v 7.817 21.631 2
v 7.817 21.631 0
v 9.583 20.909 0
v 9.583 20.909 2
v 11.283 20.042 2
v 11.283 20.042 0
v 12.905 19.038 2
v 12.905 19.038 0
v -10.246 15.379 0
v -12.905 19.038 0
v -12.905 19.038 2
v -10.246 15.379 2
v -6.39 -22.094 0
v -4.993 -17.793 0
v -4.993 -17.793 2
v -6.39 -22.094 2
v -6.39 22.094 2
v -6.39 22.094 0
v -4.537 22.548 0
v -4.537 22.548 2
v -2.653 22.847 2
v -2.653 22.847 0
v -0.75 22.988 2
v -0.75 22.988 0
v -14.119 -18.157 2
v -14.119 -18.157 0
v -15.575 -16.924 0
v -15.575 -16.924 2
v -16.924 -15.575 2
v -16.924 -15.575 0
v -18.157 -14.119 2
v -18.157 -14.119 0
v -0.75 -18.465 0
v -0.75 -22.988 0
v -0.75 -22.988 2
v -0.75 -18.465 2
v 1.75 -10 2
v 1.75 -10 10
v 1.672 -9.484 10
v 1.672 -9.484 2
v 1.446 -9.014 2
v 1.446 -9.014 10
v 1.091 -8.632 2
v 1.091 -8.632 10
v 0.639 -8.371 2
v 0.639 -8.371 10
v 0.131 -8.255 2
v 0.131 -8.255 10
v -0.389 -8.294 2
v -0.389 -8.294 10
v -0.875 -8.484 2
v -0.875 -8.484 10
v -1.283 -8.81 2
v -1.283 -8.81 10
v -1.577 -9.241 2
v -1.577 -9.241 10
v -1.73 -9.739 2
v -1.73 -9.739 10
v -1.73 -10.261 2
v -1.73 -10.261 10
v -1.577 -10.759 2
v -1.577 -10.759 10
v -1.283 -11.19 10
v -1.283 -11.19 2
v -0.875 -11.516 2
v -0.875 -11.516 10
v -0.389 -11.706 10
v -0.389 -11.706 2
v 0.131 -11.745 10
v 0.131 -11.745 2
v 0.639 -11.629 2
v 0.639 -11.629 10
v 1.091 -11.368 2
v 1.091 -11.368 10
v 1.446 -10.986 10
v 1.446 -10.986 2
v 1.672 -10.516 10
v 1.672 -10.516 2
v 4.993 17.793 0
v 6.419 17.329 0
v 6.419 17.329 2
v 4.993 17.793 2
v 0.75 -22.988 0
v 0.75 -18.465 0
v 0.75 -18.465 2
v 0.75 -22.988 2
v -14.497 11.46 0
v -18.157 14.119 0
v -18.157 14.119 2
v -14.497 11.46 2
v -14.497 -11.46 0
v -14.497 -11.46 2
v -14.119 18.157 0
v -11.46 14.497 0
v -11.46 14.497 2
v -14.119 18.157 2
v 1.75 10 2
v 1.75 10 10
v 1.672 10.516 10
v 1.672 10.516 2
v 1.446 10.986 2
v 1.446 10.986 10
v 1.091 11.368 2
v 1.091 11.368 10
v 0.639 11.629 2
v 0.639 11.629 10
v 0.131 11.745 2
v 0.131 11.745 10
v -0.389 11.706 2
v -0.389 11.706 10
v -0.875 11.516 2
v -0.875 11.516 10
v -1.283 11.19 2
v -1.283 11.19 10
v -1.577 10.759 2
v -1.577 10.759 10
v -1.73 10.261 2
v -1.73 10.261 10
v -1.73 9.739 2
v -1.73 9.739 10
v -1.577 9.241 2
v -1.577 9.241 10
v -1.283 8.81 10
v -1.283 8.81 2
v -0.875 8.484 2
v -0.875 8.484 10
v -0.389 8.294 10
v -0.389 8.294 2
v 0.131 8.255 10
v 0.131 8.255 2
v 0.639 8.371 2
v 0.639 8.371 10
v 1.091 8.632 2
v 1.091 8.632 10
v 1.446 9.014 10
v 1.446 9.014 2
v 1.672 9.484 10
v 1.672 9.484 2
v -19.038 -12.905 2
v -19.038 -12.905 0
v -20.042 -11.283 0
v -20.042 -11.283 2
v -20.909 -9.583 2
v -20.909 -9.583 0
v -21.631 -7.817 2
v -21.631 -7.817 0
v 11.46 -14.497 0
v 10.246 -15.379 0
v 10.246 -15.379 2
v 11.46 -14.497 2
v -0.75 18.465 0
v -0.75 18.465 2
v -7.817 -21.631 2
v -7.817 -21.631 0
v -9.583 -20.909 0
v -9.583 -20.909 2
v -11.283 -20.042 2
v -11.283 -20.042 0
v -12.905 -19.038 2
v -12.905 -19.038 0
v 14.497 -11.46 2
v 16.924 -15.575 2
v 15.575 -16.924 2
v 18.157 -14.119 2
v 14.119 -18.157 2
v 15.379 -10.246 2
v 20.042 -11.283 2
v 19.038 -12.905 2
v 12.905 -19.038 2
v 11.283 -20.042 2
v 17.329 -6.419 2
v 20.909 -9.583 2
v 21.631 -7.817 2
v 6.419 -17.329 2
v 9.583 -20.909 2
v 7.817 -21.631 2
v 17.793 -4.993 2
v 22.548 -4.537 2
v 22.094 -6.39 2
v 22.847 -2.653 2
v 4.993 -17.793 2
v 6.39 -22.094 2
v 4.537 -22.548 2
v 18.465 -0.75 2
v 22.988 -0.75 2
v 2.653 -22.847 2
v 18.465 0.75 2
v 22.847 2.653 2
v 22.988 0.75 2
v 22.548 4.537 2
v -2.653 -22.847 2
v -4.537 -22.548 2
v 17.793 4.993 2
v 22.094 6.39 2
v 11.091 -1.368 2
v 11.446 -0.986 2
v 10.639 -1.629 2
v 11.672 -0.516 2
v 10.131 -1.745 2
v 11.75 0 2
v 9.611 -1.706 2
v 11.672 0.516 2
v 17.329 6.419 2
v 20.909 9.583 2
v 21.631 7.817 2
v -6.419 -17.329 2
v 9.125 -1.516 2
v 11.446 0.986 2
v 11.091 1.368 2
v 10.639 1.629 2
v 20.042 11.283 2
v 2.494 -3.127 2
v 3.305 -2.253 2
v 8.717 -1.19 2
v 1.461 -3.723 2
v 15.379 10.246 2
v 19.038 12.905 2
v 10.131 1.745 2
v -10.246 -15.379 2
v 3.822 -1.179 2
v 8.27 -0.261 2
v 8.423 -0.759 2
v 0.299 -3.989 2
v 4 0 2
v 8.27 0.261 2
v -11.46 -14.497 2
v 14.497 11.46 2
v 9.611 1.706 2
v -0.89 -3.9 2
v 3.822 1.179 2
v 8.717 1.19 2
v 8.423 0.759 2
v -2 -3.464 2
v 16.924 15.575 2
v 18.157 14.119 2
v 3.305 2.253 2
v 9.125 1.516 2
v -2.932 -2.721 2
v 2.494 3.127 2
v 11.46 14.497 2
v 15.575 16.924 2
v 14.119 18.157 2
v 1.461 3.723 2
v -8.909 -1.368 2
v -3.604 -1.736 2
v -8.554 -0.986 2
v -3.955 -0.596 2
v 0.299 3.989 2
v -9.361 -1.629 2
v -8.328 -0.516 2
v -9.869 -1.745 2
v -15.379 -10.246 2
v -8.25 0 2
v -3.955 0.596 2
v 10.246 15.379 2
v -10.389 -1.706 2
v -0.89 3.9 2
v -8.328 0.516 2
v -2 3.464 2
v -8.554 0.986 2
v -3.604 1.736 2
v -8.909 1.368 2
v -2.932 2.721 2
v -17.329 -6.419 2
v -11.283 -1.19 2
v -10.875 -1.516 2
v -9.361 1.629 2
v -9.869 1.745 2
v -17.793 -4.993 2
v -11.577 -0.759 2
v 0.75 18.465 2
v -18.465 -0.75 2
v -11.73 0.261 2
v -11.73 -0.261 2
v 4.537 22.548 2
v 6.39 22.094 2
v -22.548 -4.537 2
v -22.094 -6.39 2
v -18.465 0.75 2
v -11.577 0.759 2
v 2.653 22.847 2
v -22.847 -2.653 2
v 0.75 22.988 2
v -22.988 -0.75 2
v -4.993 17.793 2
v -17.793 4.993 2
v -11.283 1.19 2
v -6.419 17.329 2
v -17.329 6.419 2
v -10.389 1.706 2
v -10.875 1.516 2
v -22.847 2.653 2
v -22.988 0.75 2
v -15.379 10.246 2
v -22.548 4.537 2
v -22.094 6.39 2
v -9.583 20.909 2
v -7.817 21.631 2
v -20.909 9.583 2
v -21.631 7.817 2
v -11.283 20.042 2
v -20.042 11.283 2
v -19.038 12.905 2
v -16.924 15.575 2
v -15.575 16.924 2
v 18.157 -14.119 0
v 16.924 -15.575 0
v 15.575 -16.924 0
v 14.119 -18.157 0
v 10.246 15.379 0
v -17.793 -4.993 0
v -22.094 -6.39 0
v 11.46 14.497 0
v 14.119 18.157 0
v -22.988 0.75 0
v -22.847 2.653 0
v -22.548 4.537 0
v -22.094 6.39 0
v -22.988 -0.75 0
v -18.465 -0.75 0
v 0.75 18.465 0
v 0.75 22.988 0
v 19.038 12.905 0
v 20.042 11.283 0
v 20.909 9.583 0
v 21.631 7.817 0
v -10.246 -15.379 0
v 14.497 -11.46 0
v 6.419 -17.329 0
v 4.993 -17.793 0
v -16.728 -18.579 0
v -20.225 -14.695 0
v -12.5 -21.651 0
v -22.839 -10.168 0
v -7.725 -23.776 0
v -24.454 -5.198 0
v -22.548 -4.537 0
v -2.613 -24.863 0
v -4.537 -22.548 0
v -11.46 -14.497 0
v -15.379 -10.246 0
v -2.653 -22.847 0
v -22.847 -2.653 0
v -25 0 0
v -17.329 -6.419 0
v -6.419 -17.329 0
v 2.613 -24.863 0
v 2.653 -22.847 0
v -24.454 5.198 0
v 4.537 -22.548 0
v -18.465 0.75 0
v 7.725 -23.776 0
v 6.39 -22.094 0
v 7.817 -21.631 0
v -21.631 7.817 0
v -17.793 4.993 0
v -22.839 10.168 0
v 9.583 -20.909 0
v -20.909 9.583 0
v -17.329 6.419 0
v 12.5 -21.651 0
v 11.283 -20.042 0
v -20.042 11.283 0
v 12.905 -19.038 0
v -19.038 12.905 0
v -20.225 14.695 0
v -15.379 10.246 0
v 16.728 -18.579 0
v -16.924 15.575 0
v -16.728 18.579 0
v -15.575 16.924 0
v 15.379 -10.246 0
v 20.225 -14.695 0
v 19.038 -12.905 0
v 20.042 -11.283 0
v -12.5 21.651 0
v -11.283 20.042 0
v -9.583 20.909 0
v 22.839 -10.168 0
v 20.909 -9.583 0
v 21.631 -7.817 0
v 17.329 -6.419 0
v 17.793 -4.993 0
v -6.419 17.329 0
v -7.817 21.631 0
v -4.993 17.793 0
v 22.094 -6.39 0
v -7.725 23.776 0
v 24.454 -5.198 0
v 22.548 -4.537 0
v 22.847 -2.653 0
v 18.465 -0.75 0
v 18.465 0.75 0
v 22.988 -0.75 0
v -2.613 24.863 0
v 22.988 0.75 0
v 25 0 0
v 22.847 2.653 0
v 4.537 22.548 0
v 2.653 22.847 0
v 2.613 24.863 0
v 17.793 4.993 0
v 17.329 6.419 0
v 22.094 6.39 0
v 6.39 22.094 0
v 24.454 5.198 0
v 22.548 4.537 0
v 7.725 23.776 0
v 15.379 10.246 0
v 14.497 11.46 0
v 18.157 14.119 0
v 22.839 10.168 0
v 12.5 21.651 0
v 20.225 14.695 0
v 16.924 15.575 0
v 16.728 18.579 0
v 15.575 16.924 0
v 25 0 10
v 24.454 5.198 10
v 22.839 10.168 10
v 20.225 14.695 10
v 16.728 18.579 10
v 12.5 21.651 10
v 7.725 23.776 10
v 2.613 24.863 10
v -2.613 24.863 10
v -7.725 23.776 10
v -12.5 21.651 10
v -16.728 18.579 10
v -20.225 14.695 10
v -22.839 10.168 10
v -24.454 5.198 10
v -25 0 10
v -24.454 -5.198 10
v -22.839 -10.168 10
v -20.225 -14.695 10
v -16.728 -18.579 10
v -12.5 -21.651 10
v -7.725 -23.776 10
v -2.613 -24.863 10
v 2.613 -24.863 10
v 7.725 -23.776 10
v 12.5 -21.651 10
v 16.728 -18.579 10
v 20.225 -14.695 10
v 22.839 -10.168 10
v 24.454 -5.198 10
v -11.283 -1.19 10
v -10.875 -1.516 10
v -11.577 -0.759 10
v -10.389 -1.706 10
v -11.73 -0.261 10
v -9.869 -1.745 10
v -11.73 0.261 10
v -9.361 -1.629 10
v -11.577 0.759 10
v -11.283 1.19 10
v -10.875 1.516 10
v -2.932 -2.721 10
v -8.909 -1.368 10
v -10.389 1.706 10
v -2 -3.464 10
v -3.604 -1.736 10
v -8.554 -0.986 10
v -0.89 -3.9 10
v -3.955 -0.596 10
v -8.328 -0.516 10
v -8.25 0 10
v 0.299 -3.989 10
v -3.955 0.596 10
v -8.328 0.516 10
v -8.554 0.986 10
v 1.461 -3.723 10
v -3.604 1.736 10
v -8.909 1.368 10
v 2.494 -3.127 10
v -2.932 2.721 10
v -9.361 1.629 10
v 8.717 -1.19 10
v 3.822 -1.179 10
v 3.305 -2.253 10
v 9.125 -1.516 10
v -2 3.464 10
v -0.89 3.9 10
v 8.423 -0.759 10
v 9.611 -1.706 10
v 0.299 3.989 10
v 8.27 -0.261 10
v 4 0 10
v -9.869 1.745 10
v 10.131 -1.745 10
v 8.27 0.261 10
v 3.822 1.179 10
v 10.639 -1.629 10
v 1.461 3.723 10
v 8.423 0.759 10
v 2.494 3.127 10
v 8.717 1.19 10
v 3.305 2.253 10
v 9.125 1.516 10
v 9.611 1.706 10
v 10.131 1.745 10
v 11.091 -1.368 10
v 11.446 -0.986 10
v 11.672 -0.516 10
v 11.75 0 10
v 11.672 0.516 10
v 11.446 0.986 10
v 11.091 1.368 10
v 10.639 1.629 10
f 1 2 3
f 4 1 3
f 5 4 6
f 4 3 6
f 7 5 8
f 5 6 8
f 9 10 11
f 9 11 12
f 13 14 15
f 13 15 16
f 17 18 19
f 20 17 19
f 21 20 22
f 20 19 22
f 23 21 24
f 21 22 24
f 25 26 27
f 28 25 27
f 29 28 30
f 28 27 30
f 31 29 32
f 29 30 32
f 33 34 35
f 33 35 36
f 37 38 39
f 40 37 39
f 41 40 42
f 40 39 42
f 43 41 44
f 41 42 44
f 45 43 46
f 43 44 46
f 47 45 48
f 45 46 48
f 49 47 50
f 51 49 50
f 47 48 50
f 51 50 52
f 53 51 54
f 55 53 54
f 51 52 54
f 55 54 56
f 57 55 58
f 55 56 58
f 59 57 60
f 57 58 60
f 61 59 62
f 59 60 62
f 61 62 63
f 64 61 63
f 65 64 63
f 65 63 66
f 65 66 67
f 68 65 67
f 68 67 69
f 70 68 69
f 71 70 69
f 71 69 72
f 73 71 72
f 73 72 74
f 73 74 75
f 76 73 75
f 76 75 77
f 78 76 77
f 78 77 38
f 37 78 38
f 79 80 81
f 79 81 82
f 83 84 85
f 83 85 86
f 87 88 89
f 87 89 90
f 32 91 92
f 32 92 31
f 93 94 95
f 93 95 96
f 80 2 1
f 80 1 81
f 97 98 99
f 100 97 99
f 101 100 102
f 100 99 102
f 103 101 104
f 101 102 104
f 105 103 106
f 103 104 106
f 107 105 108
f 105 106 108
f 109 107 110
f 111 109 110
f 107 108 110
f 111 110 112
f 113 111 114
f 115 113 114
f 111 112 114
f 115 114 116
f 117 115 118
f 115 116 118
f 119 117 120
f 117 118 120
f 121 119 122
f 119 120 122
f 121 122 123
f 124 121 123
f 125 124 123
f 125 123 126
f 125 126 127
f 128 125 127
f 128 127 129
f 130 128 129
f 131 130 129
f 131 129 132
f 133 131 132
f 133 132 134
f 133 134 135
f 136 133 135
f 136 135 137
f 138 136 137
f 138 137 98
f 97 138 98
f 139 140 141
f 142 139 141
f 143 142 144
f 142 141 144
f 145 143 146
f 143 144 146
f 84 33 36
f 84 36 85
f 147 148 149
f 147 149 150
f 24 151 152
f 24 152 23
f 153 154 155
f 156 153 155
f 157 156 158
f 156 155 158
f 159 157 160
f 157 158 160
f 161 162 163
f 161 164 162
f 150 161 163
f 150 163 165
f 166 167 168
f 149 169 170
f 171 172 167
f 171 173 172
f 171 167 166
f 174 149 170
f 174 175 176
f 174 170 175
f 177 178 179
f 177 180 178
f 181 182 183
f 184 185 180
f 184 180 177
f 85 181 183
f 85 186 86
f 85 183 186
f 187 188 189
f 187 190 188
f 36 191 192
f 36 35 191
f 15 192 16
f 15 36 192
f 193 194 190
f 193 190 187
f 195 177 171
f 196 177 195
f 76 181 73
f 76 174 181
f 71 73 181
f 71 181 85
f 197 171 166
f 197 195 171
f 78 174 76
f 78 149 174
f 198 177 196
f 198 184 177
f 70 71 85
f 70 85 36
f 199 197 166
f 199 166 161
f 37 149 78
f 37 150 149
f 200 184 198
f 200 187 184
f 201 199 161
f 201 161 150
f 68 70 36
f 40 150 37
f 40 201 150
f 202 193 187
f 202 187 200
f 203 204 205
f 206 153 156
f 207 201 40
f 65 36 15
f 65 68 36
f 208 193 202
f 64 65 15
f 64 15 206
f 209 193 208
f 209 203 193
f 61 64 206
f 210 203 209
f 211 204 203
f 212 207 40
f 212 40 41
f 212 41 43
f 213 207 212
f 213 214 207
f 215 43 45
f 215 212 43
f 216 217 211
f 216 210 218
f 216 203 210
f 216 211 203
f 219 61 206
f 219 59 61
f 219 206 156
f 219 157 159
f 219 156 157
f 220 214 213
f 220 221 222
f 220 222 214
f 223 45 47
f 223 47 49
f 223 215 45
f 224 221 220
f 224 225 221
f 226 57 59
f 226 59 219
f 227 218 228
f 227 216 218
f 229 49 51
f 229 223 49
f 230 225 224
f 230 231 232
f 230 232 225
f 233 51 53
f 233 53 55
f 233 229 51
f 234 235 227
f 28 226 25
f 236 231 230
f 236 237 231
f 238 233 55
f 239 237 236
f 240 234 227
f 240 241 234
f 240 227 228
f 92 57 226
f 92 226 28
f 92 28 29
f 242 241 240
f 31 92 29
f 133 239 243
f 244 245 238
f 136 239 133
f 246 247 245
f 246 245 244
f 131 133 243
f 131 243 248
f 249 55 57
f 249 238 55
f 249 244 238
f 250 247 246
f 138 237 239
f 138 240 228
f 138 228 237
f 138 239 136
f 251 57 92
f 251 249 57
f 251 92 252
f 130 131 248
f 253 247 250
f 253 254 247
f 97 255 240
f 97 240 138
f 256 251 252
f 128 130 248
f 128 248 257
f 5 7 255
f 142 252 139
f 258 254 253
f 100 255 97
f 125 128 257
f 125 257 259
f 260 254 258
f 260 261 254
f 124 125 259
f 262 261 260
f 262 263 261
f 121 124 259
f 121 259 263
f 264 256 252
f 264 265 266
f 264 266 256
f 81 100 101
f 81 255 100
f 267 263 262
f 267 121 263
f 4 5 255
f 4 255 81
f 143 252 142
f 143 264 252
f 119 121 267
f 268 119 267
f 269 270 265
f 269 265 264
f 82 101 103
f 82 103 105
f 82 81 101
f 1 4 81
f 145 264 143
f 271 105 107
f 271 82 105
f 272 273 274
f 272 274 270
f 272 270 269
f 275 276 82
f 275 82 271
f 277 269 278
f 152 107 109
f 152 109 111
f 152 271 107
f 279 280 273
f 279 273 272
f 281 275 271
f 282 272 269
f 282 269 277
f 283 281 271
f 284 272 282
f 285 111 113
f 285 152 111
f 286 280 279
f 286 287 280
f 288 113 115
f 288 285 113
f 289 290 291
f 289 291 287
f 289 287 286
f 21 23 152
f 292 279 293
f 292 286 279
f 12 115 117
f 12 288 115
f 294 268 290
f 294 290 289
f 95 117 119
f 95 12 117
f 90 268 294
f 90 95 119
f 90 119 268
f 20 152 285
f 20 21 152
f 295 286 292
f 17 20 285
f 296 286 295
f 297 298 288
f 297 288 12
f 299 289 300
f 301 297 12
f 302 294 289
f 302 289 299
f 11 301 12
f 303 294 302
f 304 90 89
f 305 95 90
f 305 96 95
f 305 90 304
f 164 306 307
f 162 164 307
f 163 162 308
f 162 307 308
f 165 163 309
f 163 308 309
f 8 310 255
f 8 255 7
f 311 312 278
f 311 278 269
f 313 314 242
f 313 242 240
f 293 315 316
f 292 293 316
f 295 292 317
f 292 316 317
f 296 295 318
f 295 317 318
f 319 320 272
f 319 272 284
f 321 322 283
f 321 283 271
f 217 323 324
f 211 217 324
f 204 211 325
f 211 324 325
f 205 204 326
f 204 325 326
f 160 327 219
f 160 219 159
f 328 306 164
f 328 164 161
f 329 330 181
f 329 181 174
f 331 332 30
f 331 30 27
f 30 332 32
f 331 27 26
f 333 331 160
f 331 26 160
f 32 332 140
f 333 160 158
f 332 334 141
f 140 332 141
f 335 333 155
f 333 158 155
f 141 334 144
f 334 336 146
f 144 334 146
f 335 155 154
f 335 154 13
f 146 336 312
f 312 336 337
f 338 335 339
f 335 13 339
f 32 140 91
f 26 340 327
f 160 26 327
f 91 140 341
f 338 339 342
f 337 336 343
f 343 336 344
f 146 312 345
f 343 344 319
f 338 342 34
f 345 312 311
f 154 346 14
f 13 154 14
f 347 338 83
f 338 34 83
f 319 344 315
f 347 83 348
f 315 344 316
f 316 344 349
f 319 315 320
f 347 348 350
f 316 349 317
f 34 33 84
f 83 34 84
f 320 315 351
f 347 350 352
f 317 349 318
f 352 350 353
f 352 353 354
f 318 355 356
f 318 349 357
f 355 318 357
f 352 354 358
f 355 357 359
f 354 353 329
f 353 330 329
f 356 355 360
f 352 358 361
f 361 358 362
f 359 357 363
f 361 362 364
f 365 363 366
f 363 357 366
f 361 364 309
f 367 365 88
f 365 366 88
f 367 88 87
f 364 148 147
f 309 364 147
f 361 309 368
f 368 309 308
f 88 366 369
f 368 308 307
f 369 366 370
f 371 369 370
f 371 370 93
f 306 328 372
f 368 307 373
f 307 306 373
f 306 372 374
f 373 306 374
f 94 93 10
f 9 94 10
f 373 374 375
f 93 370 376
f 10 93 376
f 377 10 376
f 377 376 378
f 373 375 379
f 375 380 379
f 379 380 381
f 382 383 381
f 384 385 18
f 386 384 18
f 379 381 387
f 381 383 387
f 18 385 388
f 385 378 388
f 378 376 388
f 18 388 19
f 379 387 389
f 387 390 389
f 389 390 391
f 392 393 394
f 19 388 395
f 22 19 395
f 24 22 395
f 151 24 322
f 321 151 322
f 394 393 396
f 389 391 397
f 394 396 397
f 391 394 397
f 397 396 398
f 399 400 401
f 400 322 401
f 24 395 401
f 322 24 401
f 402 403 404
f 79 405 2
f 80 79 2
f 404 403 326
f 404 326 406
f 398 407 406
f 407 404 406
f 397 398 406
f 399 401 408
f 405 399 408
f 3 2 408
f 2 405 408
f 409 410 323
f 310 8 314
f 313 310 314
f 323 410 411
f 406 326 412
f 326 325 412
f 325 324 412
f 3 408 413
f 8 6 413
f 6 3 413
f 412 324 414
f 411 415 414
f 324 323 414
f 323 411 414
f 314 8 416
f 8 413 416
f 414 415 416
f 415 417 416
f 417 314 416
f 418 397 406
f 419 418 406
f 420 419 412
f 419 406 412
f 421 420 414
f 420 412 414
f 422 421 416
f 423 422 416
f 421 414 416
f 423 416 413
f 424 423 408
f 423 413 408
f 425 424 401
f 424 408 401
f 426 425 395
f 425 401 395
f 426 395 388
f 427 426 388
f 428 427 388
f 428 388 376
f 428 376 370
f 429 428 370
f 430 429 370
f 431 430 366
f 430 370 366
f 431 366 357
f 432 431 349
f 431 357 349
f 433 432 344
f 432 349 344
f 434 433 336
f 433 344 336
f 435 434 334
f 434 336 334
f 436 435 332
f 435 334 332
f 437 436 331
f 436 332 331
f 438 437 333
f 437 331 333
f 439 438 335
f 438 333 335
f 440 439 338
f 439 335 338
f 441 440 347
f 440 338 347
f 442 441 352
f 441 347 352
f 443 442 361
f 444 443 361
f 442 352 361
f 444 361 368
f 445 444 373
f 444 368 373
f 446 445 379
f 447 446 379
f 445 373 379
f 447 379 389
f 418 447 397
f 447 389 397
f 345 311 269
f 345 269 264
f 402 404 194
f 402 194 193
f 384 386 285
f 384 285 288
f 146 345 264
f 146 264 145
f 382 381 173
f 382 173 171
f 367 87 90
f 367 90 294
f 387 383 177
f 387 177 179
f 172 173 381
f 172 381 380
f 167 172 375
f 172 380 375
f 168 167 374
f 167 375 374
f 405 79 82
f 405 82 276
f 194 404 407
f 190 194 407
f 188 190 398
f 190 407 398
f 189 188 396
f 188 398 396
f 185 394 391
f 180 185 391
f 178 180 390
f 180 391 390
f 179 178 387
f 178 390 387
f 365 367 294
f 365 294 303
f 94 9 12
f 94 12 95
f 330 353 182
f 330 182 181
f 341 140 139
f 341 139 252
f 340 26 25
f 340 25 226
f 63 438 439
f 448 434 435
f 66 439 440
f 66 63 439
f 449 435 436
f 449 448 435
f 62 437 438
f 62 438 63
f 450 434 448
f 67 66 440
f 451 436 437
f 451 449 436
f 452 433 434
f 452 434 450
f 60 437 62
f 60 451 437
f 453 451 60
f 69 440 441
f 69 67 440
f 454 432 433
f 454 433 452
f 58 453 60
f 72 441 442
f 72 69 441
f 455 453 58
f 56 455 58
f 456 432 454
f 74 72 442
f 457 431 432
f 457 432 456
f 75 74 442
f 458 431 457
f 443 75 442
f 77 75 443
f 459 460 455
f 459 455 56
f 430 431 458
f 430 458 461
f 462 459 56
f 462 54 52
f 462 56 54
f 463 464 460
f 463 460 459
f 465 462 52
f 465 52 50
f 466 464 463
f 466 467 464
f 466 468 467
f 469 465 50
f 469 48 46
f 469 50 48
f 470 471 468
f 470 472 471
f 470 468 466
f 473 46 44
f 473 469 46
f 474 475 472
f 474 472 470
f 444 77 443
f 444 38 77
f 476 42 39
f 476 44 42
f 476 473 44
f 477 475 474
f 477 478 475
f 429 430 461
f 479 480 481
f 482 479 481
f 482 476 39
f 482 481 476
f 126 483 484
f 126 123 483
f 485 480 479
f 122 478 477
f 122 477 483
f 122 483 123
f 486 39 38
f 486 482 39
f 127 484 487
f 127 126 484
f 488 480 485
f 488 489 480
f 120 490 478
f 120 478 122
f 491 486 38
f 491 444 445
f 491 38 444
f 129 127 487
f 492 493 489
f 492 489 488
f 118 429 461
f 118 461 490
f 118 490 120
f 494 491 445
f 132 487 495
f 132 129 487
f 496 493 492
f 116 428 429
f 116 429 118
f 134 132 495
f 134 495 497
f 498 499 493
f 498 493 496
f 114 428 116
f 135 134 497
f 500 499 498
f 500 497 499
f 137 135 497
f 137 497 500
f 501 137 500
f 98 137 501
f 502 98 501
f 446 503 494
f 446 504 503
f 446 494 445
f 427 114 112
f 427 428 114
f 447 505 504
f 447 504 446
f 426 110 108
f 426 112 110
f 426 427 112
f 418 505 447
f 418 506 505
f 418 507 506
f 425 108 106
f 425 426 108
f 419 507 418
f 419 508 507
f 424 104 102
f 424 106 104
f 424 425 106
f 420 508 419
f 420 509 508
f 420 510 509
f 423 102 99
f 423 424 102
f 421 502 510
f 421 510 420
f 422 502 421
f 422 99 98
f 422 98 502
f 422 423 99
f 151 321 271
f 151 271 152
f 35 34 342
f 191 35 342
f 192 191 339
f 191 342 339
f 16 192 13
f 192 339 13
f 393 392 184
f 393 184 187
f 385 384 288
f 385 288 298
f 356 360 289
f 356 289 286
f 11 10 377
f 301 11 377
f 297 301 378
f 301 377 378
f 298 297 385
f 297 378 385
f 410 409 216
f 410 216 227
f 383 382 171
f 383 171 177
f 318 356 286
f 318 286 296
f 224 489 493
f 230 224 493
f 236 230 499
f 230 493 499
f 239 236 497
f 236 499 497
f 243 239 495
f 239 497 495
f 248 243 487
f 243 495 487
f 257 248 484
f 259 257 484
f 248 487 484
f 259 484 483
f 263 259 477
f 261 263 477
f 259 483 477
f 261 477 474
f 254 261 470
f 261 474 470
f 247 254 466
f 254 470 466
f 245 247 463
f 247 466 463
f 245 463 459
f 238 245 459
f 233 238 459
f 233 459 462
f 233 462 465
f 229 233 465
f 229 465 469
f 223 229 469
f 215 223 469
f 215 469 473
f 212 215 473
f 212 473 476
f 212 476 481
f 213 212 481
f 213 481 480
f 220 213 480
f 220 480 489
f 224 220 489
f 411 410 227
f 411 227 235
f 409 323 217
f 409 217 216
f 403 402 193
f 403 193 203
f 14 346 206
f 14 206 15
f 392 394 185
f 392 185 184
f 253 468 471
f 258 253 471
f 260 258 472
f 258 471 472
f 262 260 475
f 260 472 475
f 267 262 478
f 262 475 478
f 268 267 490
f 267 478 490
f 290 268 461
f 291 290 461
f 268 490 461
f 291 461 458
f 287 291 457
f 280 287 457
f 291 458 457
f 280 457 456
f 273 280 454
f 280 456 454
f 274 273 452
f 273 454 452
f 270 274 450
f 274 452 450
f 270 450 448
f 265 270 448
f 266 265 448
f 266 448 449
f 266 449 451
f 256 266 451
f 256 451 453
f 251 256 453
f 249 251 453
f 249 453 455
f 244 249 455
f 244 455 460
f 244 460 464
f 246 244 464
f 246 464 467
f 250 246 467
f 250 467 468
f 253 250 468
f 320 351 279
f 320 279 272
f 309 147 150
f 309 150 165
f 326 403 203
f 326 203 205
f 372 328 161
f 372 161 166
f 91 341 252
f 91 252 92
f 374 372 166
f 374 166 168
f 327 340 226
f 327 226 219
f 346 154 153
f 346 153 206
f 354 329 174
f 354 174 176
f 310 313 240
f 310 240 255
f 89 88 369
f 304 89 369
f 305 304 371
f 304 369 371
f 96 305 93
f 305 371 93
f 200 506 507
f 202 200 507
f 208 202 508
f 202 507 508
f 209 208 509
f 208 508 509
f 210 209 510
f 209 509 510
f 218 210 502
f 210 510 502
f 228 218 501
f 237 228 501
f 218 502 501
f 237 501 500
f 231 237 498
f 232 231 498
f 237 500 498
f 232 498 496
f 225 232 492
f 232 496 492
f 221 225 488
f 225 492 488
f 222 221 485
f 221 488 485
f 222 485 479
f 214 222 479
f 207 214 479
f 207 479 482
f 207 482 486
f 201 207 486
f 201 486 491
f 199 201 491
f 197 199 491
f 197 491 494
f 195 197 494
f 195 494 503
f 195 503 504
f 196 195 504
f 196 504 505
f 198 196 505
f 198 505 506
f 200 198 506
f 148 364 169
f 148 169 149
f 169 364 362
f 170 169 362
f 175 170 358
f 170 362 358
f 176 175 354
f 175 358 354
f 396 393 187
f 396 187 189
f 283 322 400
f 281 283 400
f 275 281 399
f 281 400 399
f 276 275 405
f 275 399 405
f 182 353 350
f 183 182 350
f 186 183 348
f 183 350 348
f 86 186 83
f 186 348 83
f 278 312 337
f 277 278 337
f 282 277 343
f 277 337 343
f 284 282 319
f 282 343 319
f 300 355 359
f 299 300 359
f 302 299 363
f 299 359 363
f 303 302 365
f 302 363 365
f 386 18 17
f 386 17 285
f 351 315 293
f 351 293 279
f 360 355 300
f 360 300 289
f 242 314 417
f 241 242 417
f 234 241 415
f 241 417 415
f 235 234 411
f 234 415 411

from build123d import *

# Parameters (mm, degrees)
SKETCH1_R           = 25
BOSS_EXTRUDE1_DEPTH = 10
SKETCH2_R           = 23
CUT_EXTRUDE1_DEPTH  = 2
SKETCH3_R           = 4
SKETCH3_R_2         = 1.75
CUT_EXTRUDE2_DEPTH  = 37.742346142
BOSS_EXTRUDE2_START = 2
BOSS_EXTRUDE2_DEPTH = 2
CIRPATTERN1_COUNT   = 20


with BuildPart() as part:
    # Sketch1 → Boss-Extrude1 (new body)
    with BuildSketch(Plane.XY):
        Circle(SKETCH1_R)
    extrude(amount=BOSS_EXTRUDE1_DEPTH)

    # Sketch2 → Cut-Extrude1 (cut)
    with BuildSketch(Plane(origin=(0, 0, 0), x_dir=(-1, 0, 0), z_dir=(0, 0, -1))):
        Circle(SKETCH2_R)
    extrude(amount=-CUT_EXTRUDE1_DEPTH, mode=Mode.SUBTRACT)

    # Sketch3 → Cut-Extrude2 (cut, through all)
    with BuildSketch(Plane.XY.offset(10)):
        Circle(SKETCH3_R)
        with Locations((10, 0)):
            Circle(SKETCH3_R_2)
        with Locations((0, -10)):
            Circle(SKETCH3_R_2)
        with Locations((-10, 0)):
            Circle(SKETCH3_R_2)
        with Locations((0, 10)):
            Circle(SKETCH3_R_2)
    extrude(amount=-CUT_EXTRUDE2_DEPTH, mode=Mode.SUBTRACT)

    # Sketch4 → Boss-Extrude2 (add)
    with BuildSketch(Plane(origin=(0, 0, 2), x_dir=(-1, 0, 0), z_dir=(0, 0, -1)).offset(BOSS_EXTRUDE2_START)):
        with BuildLine():
            Line((-0.75, 22.987768487), (-0.75, 18.464528853))
            Line((-0.75, 18.464528853), (0.75, 18.464528853))
            Line((0.75, 18.464528853), (0.75, 22.987768487))
            ThreePointArc((0.75, 22.987768487), (0, 23), (-0.75, 22.987768487))
        make_face()
    boss_extrude2 = extrude(amount=-BOSS_EXTRUDE2_DEPTH)

    # CirPattern1: Boss-Extrude2 ×20 about axis
    cirpattern1_axis = Axis((0, 0, 0), (0, 0, 1))
    for i in range(1, CIRPATTERN1_COUNT):
        add(boss_extrude2.rotate(cirpattern1_axis, i * 360 / CIRPATTERN1_COUNT))


solid = part.part
